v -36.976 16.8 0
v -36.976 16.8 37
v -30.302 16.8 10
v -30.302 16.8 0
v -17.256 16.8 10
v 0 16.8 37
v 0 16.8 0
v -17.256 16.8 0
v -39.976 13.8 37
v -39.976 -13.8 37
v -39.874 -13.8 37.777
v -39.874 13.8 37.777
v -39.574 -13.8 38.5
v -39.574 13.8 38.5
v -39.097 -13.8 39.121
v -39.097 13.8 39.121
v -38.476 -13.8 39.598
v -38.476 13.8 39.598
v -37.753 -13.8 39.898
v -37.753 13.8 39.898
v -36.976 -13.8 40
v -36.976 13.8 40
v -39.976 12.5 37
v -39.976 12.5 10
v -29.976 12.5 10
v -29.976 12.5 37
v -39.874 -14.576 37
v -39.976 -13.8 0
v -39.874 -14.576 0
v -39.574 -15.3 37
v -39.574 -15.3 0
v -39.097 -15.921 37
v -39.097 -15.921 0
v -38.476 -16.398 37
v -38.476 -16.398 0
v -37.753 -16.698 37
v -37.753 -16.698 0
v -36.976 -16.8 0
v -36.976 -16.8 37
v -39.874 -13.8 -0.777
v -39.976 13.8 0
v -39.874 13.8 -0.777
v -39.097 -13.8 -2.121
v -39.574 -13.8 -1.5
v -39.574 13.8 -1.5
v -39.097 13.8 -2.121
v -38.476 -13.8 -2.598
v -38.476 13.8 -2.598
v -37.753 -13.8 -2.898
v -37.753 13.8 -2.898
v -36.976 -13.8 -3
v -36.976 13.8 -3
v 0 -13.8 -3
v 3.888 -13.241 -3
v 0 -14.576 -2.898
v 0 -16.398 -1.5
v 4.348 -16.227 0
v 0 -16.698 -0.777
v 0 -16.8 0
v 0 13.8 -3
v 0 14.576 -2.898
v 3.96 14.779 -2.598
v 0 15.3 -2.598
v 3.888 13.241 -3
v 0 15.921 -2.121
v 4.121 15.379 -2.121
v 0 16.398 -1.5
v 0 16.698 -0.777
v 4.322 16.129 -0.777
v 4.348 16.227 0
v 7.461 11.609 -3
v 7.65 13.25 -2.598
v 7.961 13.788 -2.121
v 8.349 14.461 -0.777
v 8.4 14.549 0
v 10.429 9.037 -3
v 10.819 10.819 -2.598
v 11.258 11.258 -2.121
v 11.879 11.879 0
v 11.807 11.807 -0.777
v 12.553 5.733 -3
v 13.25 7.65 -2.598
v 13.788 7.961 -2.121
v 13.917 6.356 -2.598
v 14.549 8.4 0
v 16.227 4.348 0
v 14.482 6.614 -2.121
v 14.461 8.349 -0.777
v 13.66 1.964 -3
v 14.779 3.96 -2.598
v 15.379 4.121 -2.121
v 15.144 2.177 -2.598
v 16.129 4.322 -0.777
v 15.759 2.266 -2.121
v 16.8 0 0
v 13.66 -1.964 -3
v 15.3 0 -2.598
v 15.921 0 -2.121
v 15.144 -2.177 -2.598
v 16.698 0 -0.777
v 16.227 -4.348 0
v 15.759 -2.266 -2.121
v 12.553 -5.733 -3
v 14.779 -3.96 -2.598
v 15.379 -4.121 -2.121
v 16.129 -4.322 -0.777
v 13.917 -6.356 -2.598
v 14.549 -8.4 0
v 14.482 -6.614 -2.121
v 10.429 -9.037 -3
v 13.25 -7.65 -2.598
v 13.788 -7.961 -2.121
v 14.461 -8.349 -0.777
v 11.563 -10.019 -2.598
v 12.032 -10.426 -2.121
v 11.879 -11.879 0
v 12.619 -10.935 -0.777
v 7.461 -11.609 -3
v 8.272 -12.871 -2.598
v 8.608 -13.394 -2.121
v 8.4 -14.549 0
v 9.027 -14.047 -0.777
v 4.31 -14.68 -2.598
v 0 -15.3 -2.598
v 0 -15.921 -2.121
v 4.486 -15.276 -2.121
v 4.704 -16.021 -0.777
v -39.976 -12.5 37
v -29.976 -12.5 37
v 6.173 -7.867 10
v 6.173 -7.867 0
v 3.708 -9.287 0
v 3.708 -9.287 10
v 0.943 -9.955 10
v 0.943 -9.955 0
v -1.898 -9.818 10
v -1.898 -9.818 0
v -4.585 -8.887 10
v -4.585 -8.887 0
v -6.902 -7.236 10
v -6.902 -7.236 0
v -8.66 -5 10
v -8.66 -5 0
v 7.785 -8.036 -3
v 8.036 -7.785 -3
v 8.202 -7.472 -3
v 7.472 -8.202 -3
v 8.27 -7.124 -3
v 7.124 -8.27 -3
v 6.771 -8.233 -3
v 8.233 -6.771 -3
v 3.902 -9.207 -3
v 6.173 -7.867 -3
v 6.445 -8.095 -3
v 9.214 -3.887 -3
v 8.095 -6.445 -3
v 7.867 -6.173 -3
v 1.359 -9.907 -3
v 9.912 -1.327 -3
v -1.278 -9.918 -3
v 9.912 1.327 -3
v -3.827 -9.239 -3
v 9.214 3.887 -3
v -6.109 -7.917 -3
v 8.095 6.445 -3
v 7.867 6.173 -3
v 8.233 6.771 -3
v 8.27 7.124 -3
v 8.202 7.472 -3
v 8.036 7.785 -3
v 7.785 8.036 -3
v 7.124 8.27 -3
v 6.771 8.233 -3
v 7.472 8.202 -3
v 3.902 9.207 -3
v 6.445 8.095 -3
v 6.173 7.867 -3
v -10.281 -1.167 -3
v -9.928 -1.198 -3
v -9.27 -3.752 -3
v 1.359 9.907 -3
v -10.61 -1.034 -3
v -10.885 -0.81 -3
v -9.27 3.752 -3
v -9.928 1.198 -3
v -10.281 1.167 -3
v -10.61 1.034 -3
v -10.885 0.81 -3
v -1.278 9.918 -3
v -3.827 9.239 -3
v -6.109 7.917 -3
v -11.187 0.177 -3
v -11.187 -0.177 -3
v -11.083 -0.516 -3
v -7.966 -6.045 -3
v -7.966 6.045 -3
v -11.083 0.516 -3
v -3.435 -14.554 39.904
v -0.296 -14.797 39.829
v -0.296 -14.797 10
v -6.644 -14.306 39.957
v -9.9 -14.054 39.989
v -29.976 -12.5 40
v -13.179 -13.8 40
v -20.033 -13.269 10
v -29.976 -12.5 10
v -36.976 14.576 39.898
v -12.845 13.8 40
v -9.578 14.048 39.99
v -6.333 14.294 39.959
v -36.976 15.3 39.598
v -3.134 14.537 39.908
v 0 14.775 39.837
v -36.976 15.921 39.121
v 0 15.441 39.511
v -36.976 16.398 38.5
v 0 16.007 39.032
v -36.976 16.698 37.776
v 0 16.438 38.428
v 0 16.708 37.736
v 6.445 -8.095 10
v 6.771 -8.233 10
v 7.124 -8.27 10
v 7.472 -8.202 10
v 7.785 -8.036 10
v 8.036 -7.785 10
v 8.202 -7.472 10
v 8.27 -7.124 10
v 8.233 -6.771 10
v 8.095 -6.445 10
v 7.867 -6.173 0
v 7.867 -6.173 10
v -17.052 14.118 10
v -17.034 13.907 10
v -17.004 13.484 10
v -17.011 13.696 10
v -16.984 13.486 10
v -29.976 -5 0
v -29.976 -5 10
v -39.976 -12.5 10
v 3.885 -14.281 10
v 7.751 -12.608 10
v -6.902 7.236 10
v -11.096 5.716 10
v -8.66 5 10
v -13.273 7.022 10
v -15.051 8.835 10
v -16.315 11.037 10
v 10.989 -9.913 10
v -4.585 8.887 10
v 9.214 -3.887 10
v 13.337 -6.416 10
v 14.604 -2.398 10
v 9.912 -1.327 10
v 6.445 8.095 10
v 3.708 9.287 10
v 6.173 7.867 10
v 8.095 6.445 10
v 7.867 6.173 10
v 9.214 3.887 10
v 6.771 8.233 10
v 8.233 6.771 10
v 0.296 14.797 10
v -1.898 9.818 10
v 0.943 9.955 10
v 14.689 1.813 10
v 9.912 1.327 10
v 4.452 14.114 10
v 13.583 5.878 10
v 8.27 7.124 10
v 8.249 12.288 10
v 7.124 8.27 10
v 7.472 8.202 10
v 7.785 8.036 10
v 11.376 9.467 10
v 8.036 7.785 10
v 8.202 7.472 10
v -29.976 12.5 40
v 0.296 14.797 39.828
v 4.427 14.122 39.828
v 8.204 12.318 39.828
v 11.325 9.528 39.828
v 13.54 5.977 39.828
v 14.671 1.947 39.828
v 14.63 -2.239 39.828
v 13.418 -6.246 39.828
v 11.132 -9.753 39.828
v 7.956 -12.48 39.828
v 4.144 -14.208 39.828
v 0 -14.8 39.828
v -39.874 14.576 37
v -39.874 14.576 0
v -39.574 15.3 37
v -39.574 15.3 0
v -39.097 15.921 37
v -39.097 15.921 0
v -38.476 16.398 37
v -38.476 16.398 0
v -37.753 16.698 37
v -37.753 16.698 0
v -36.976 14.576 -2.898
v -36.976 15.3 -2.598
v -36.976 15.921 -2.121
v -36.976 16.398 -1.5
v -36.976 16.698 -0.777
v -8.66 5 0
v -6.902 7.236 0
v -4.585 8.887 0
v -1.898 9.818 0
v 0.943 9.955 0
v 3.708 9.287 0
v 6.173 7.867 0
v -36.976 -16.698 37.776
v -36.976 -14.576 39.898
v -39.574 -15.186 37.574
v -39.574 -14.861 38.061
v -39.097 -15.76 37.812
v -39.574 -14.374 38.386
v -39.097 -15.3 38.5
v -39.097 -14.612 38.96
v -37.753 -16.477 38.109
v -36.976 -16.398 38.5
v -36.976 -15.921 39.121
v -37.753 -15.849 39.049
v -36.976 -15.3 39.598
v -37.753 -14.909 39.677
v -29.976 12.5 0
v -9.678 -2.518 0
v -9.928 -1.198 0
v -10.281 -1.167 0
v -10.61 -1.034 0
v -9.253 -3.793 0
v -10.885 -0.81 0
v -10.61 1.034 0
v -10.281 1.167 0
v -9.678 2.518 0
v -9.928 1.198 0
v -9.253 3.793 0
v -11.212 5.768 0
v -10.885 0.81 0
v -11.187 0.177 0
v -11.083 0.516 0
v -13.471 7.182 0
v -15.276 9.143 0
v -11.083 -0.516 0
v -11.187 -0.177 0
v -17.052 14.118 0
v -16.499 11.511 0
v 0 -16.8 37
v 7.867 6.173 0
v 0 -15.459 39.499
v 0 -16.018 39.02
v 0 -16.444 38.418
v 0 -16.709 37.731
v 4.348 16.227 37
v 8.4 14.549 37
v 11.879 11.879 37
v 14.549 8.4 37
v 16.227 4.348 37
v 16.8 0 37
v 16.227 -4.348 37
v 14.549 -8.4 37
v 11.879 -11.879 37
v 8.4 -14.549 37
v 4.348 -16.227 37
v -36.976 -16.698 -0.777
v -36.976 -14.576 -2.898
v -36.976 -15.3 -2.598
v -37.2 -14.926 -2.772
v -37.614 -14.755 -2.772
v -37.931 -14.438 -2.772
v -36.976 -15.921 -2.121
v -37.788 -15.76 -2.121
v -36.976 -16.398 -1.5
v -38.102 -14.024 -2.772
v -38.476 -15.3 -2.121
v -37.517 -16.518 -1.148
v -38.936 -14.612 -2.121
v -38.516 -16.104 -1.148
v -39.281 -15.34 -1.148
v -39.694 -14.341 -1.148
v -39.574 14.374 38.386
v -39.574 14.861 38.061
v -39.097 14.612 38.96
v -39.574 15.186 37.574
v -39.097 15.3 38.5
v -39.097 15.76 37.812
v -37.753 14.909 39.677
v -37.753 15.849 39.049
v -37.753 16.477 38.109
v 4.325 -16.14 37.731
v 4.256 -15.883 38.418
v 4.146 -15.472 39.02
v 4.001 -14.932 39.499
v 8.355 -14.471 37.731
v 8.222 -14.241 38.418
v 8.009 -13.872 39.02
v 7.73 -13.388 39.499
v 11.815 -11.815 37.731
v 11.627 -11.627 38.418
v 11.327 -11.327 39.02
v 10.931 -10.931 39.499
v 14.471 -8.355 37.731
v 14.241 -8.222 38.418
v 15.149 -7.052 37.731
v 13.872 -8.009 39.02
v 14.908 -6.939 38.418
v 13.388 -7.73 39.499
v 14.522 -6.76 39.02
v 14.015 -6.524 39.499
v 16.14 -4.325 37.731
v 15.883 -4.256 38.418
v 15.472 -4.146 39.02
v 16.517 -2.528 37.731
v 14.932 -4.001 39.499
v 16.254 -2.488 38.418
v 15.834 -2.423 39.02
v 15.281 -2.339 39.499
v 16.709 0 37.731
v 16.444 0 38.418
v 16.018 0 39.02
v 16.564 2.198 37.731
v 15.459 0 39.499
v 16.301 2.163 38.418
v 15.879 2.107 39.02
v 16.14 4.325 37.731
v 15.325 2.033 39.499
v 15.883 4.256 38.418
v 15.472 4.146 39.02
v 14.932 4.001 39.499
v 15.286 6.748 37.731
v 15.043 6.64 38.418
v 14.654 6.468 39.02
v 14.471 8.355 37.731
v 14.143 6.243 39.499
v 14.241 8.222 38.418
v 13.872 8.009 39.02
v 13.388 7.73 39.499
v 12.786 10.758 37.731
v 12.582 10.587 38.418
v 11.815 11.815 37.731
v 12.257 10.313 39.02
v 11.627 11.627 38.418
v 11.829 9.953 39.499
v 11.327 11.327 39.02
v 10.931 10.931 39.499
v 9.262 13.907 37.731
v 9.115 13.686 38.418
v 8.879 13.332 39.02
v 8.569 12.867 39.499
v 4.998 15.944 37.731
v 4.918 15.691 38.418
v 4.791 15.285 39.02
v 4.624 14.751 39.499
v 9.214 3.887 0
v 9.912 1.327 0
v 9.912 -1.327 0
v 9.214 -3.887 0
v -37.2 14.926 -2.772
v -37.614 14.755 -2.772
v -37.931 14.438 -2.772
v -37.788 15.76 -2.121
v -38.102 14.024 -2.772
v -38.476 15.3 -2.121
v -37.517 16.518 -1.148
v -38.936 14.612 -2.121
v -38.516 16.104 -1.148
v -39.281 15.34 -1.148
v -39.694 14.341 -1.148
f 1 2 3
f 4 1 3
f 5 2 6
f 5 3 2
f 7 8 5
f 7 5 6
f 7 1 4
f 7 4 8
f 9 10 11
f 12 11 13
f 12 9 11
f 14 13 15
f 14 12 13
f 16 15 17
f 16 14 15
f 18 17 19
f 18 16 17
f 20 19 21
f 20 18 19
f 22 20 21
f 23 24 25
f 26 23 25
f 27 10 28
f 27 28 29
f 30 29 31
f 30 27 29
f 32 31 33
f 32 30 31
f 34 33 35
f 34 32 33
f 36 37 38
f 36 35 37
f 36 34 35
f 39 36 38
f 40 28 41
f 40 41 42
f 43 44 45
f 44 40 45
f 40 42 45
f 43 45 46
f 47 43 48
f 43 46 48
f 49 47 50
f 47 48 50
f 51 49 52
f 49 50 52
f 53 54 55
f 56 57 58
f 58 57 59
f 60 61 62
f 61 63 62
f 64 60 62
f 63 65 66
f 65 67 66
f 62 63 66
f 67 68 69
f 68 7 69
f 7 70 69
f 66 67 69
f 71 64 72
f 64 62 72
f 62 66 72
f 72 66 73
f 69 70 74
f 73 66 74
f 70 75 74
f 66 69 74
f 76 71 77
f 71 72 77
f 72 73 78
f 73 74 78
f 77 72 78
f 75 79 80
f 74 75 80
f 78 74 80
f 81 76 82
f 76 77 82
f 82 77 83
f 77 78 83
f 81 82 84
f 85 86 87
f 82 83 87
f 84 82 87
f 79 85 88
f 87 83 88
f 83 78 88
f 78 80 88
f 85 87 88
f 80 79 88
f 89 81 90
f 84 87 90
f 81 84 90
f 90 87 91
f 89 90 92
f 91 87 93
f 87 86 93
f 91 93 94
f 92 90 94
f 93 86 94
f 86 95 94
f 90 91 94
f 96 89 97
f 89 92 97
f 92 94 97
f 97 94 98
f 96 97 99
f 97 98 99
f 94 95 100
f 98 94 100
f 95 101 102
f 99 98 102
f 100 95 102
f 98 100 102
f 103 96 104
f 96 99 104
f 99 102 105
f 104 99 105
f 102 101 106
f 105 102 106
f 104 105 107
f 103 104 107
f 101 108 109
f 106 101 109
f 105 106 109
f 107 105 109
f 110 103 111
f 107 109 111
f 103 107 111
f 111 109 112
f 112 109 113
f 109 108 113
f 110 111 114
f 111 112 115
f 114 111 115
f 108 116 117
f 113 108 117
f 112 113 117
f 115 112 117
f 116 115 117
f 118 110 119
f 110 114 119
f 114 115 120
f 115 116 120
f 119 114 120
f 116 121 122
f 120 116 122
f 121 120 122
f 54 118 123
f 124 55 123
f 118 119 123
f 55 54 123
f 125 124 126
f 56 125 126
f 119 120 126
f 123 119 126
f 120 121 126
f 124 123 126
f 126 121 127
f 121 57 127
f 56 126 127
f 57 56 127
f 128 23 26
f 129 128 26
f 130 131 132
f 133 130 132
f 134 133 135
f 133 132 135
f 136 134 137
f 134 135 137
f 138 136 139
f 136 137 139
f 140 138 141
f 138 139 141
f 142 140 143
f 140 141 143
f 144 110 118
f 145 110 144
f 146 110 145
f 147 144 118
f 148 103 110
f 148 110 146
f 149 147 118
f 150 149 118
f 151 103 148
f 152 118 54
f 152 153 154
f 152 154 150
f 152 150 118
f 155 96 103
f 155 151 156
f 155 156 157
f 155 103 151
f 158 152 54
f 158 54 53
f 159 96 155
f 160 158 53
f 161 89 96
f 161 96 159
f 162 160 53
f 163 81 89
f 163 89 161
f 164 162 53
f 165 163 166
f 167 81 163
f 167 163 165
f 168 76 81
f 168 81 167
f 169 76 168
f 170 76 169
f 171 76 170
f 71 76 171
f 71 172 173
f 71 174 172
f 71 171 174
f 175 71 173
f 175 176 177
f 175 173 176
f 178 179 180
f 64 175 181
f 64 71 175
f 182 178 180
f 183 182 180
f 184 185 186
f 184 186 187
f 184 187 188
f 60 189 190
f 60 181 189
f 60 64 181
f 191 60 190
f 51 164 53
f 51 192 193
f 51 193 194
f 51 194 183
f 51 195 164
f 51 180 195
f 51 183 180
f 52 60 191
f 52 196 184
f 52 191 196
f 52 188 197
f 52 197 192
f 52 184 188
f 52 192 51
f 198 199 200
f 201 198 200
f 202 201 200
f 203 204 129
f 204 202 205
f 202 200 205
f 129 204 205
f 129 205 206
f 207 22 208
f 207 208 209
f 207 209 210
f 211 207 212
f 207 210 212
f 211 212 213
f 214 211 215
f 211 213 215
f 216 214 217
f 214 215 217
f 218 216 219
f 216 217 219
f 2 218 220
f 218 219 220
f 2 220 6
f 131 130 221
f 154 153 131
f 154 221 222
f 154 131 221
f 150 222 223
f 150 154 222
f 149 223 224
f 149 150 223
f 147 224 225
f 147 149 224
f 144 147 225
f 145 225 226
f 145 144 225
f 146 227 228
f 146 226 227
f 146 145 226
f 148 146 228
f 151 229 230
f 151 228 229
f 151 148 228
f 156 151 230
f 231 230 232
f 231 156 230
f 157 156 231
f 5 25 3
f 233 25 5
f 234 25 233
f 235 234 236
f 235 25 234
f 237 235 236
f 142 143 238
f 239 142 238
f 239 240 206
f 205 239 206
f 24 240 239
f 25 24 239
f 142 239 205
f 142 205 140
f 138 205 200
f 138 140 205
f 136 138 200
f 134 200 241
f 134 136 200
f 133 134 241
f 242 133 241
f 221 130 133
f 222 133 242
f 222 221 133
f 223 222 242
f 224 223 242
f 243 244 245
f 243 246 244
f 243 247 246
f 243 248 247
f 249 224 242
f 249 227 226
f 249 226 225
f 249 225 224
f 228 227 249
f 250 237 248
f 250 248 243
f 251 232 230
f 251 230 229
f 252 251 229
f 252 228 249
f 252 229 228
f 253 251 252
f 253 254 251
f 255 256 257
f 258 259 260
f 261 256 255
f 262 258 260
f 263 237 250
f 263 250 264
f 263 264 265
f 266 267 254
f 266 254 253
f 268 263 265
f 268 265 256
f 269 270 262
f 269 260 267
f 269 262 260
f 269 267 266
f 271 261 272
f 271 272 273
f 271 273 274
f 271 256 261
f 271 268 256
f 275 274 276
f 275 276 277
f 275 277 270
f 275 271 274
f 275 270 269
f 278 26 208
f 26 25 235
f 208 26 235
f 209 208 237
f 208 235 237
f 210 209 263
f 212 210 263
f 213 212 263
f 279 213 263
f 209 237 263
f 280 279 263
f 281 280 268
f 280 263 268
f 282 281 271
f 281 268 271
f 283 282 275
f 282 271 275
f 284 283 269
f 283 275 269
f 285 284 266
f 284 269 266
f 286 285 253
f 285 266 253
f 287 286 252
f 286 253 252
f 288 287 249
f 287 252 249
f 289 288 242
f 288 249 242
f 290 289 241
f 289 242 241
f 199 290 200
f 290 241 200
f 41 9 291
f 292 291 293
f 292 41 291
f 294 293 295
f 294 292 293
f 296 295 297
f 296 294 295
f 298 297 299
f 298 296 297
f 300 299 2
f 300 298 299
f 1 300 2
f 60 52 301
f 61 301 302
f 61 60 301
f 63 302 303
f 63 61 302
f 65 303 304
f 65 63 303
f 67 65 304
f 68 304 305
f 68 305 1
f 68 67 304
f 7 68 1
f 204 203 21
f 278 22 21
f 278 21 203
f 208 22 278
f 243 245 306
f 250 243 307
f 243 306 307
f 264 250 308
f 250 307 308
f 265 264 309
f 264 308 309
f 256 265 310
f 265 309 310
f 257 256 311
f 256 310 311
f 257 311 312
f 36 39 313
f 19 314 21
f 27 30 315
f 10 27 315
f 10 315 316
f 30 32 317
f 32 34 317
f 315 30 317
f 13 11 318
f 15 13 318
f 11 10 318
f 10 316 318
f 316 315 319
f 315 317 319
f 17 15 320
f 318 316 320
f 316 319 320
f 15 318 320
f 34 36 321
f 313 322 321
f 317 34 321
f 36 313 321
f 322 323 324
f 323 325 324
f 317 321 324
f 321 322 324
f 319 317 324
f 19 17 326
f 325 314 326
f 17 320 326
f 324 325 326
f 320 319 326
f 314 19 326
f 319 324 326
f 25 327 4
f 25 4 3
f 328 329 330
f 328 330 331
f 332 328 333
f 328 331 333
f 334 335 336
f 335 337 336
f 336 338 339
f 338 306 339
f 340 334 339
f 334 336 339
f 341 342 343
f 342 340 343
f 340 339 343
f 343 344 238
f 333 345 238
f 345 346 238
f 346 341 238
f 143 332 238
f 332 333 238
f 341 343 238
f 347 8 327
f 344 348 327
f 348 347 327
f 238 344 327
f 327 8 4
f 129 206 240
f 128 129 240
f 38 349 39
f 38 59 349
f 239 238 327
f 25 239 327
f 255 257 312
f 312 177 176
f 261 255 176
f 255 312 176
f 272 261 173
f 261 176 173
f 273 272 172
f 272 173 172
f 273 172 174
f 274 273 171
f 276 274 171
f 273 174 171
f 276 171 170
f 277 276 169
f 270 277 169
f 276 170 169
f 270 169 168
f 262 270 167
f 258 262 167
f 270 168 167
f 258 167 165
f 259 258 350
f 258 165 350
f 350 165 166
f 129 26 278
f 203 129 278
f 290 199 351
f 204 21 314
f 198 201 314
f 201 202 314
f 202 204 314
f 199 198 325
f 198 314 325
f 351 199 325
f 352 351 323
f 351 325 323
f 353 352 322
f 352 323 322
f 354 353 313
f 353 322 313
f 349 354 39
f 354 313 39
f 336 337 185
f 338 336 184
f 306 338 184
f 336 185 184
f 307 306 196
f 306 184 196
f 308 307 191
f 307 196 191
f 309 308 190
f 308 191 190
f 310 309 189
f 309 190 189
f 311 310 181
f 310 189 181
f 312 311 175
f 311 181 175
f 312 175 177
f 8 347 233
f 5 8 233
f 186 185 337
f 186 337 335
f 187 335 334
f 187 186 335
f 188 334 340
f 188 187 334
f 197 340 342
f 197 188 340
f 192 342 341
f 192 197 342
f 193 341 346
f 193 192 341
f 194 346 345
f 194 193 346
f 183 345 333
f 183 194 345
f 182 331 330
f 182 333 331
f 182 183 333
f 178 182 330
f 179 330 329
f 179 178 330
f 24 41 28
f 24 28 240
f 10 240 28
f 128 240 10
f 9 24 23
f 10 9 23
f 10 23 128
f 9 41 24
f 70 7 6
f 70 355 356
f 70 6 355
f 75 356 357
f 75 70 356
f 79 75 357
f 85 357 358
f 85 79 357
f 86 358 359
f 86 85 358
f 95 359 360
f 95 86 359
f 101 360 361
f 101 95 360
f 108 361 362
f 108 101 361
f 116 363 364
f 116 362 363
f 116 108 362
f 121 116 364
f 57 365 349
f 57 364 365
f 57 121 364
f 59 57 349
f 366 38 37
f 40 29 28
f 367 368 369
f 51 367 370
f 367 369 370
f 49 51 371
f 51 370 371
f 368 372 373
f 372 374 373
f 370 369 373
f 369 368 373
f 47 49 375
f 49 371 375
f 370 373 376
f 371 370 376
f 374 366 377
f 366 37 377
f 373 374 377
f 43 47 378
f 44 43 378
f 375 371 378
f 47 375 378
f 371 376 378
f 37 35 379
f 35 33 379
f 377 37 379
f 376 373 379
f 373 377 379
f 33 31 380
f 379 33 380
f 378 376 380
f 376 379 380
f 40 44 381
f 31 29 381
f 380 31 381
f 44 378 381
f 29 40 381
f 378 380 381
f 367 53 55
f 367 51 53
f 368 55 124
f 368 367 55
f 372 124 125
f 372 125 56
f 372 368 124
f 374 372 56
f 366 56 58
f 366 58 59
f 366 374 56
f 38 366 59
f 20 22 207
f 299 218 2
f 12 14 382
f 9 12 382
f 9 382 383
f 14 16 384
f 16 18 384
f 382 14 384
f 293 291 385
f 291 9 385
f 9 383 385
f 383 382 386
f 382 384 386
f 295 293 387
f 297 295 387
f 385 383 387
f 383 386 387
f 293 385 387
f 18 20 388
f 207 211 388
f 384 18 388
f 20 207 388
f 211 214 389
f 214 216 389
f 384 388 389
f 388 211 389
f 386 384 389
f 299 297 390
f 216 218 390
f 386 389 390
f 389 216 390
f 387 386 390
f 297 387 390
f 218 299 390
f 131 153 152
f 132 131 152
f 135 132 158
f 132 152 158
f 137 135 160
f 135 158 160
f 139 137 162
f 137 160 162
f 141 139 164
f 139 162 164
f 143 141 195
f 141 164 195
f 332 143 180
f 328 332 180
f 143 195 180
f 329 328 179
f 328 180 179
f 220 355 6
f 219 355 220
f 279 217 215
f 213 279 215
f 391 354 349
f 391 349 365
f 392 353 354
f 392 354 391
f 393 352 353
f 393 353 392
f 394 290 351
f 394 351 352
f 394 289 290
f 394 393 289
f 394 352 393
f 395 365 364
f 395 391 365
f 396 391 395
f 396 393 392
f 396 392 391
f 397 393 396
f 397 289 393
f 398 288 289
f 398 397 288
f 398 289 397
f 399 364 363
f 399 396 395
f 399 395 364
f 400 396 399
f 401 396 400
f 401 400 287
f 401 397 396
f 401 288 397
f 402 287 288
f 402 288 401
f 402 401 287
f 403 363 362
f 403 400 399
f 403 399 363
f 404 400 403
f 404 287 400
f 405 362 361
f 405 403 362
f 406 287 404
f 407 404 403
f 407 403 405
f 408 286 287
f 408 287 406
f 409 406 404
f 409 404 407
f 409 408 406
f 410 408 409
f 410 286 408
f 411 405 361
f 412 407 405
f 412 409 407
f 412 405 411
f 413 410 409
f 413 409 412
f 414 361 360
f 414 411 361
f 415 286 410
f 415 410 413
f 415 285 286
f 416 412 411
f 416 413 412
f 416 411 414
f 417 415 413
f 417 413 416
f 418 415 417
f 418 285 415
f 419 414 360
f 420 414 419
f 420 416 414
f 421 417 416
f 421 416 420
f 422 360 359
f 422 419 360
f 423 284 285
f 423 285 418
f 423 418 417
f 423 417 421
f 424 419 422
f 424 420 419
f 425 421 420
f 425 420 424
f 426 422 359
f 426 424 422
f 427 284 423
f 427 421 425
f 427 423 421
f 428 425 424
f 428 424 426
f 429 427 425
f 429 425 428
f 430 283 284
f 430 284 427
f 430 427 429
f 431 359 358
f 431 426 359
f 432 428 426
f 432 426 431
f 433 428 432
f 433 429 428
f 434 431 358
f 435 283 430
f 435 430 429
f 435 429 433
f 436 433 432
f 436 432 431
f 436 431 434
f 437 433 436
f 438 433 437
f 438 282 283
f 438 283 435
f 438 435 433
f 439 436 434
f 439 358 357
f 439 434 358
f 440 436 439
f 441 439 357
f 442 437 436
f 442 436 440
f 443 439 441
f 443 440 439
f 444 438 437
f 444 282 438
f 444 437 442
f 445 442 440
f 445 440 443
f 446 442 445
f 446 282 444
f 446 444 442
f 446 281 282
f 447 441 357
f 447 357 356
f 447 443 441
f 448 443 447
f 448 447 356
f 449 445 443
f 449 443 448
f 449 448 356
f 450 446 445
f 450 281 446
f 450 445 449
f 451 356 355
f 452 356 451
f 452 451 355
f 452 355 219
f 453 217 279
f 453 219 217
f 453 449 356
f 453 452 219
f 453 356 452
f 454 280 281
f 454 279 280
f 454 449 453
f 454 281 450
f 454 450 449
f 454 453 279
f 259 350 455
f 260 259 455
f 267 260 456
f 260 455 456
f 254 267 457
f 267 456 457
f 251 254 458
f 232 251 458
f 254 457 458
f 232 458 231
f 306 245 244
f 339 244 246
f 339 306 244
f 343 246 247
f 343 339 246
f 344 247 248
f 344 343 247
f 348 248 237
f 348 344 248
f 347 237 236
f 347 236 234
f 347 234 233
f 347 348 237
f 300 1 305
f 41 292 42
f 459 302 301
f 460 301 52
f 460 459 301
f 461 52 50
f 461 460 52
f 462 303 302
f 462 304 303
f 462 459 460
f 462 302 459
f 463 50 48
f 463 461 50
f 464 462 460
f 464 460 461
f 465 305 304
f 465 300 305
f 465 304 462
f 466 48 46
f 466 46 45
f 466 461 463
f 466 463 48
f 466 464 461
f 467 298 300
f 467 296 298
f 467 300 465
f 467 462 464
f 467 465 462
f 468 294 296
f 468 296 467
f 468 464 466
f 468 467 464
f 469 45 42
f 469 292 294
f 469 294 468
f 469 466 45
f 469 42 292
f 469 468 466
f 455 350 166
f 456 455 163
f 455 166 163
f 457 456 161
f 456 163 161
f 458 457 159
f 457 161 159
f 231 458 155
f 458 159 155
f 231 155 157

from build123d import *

# Parameters (mm, degrees)
EXTRUDE_9_DEPTH      = 40
EXTRUDE_START        = 3
EXTRUDE_10_DEPTH     = 3
SKETCH_11_R          = 10
CUT_EXTRUDE_1_DEPTH  = 3
EXTRUDE_11_DEPTH     = 10
SKETCH_21_W          = 13.008941923
SKETCH_21_H          = 10
CUT_EXTRUDE_9_DEPTH  = 65.045413014
EXTRUDE_12_REACH     = 65.691
SKETCH_23_W          = 10
SKETCH_23_H          = 3
FILLET_1_R           = 3
FILLET_2_R           = 3
FILLET_3_DEPTH       = 10
CUT_EXTRUDE_10_REACH = 63.068


with BuildPart() as part:
    # 草图5 → 凸台-拉伸9 (new body)
    with BuildSketch(Plane.XY):
        with BuildLine():
            Line((0, 16.799900253), (-39.976031579, 16.799900253))
            Line((-39.976031579, 16.799900253), (-39.976031579, 12.499900253))
            Line((-39.976031579, 12.499900253), (-29.976031579, 12.499900253))
            Line((-29.976031579, 12.499900253), (0.295610531, 14.79704749))
            ThreePointArc((0.295610531, 14.79704749), (14.79704749, -0.295610531), (-0.295610531, -14.79704749))
            Line((-0.295610531, -14.79704749), (-29.976031579, -12.499900253))
            Line((-29.976031579, -12.499900253), (-39.976031579, -12.499900253))
            Line((-39.976031579, -12.499900253), (-39.976031579, -16.799900253))
            Line((-39.976031579, -16.799900253), (0, -16.799900253))
            ThreePointArc((0, -16.799900253), (16.799900253, 0), (0, 16.799900253))
        make_face()
    extrude(amount=EXTRUDE_9_DEPTH)

    # 草图10 → 凸台-拉伸10 (add)
    with BuildSketch(Plane(origin=(0, 0, 0), x_dir=(-1, 0, 0), z_dir=(0, 0, -1)).offset(EXTRUDE_START)):
        with BuildLine():
            Line((0, -16.799900253), (39.976031579, -16.799900253))
            Line((39.976031579, -16.799900253), (39.976031579, 16.799900253))
            Line((39.976031579, 16.799900253), (0, 16.799900253))
            ThreePointArc((0, 16.799900253), (-16.799900253, 0), (0, -16.799900253))
        make_face()
    extrude(amount=-EXTRUDE_10_DEPTH)

    # 草图11 → 切除-拉伸1 (cut)
    with BuildSketch(Plane(origin=(0, 0, -3), x_dir=(-1, 0, 0), z_dir=(0, 0, -1))):
        Circle(SKETCH_11_R)
    extrude(amount=-CUT_EXTRUDE_1_DEPTH, mode=Mode.SUBTRACT)

    # 草图18 → 凸台-拉伸11 (add)
    with BuildSketch(Plane.XY):
        with BuildLine():
            Line((-39.976031579, -12.499900253), (-29.976031579, -12.499900253))
            Line((-29.976031579, -12.499900253), (-20.032968003, -13.26945406))
            Line((-20.032968003, -13.26945406), (-0.295610531, -14.79704749))
            ThreePointArc((-0.295610531, -14.79704749), (14.79704749, -0.295610531), (0.295610531, 14.79704749))
            Line((0.295610531, 14.79704749), (-17.004384343, 13.484246708))
            Line((-17.004384343, 13.484246708), (-17.004384343, 5))
            Line((-17.004384343, 5), (-8.660254038, 5))
            ThreePointArc((-8.660254038, 5), (10, 0), (-8.660254038, -5))
            Line((-8.660254038, -5), (-20, -5))
            Line((-20, -5), (-29.976031579, -5))
            Line((-29.976031579, -5), (-29.976031579, 5))
            Line((-29.976031579, 5), (-29.976031579, 12.499900253))
            Line((-29.976031579, 12.499900253), (-39.976031579, 12.499900253))
            Line((-39.976031579, 12.499900253), (-39.976031579, -12.499900253))
        make_face()
    extrude(amount=EXTRUDE_11_DEPTH)

    # 草图21 → 切除-拉伸9 (cut, through all)
    with BuildSketch(Plane(origin=(-1.114744508, 14.690023458, 0), x_dir=(0.9971331498487674, 0.07566691134621262, 0), z_dir=(0.07566691134621262, -0.9971331498487674, 0))):
        with Locations((-22.439794983, 5)):
            Rectangle(SKETCH_21_W, SKETCH_21_H)
    extrude(amount=-CUT_EXTRUDE_9_DEPTH, mode=Mode.SUBTRACT)

    # 草图23 → 凸台-拉伸12 (add, up to next)
    with BuildSketch(Plane.XZ.offset(-12.499900253), mode=Mode.PRIVATE) as extrude_12_sk1:
        with Locations((-34.976031579, 38.5)):
            Rectangle(SKETCH_23_W, SKETCH_23_H)
    extrude_12_tool1 = extrude(extrude_12_sk1.sketch, amount=EXTRUDE_12_REACH, mode=Mode.PRIVATE) - part.part
    add(extrude_12_tool1.solids().sort_by_distance((-34.976032, 12.4999, 38.5))[0])

    # 圆角1
    # the kernel refuses this fillet: 3 mm, written as the material it takes off along each edge
    with BuildSketch(Plane(origin=(-47.476031579, -16.799900253, 40), x_dir=(0, 0, -1), z_dir=(1, 0, 0)), Plane(origin=(0, 16.799900253, 40), x_dir=(0, 0, -1), z_dir=(-1, 0, 0))) as fillet_1_piece_1:
        with BuildLine():
            CenterArc((FILLET_1_R, FILLET_1_R), FILLET_1_R, 180, 90)
            Line((0, FILLET_1_R), (0, 0))
            Line((0, 0), (FILLET_1_R, 0))
        make_face()
    extrude(amount=47.476031579, mode=Mode.SUBTRACT)
    with BuildSketch(Plane(origin=(0, 0, 40), x_dir=(0, -1, 0), z_dir=(-1, 0, 0))) as fillet_1_piece_2:
        with BuildLine():
            CenterArc((16.799900253 - FILLET_1_R, -FILLET_1_R), FILLET_1_R, 0, 90)
            Line((16.799900253, -FILLET_1_R), (16.799900253, 0))
            Line((16.799900253, 0), (16.799900253 - FILLET_1_R, 0))
        make_face()
    revolve(axis=Axis((0, 0, 40), (0, 0, 1)), revolution_arc=180, mode=Mode.SUBTRACT)

    # 圆角2
    fillet_2_edges = [part.edges().sort_by_distance(p)[0] for p in [
        (-39.976031579, 0, 40),
        (-39.976031579, -16.799900253, 17),
        (-39.976031579, 16.799900253, 17),
        (-39.976031579, 15.921220597, 39.121320344),
        (-39.976031579, -15.921220597, 39.121320344),
        (16.799900253, 0, -3),
        (-19.988015789, -16.799900253, -3),
        (-39.976031579, 0, -3),
        (-19.988015789, 16.799900253, -3),
    ]]
    fillet(fillet_2_edges, radius=FILLET_2_R - 0.0001)  # a hair under: the kernel refuses the full size

    # 圆角3: read off the stored shape, not the designer's step
    # 圆角3 outline → 圆角3 (cut)
    with BuildSketch(Plane.XY):
        with BuildLine():
            Line((-17.004384343, 5), (-8.660254038, 5))
            ThreePointArc((-8.660254038, 5), (-14.43892528, 8.102315607), (-17.052465962, 14.117862844))
            Line((-17.052465962, 14.117862844), (-17.004384343, 13.484246708))
            Line((-17.004384343, 13.484246708), (-17.004384343, 5))
        make_face()
    extrude(amount=FILLET_3_DEPTH, mode=Mode.SUBTRACT)

    # 草图27 → 切除-拉伸10 (cut, up to next)
    with BuildSketch(Plane(origin=(0, 0, -3), x_dir=(-1, 0, 0), z_dir=(0, 0, -1)), mode=Mode.PRIVATE) as cut_extrude_10_sk1:
        with BuildLine():
            ThreePointArc((9.928, -1.197838052), (10, 0), (9.928, 1.197838052))
            ThreePointArc((9.928, 1.197838052), (11.2, 0), (9.928, -1.197838052))
        make_face()
    cut_extrude_10_tool1 = extrude(cut_extrude_10_sk1.sketch, amount=-CUT_EXTRUDE_10_REACH, mode=Mode.PRIVATE) & part.part
    # 草图27 → 切除-拉伸10 (cut, up to next)
    with BuildSketch(Plane(origin=(0, 0, -3), x_dir=(-1, 0, 0), z_dir=(0, 0, -1)), mode=Mode.PRIVATE) as cut_extrude_10_sk2:
        with BuildLine():
            ThreePointArc((-6.173156714, -7.867155533), (-7.919595949, -7.919595949), (-7.867155533, -6.173156714))
            ThreePointArc((-7.867155533, -6.173156714), (-7.071067812, -7.071067812), (-6.173156714, -7.867155533))
        make_face()
    cut_extrude_10_tool2 = extrude(cut_extrude_10_sk2.sketch, amount=-CUT_EXTRUDE_10_REACH, mode=Mode.PRIVATE) & part.part
    # 草图27 → 切除-拉伸10 (cut, up to next)
    with BuildSketch(Plane(origin=(0, 0, -3), x_dir=(-1, 0, 0), z_dir=(0, 0, -1)), mode=Mode.PRIVATE) as cut_extrude_10_sk3:
        with BuildLine():
            ThreePointArc((-7.867155533, 6.173156714), (-7.071067812, 7.071067812), (-6.173156714, 7.867155533))
            ThreePointArc((-6.173156714, 7.867155533), (-7.919595949, 7.919595949), (-7.867155533, 6.173156714))
        make_face()
    cut_extrude_10_tool3 = extrude(cut_extrude_10_sk3.sketch, amount=-CUT_EXTRUDE_10_REACH, mode=Mode.PRIVATE) & part.part
    add(cut_extrude_10_tool1.solids().sort_by_distance((-10.496108, 0, -3))[0], mode=Mode.SUBTRACT)
    add(cut_extrude_10_tool2.solids().sort_by_distance((7.421869, -7.421869, -3))[0], mode=Mode.SUBTRACT)
    add(cut_extrude_10_tool3.solids().sort_by_distance((7.421869, 7.421869, -3))[0], mode=Mode.SUBTRACT)


solid = part.part
